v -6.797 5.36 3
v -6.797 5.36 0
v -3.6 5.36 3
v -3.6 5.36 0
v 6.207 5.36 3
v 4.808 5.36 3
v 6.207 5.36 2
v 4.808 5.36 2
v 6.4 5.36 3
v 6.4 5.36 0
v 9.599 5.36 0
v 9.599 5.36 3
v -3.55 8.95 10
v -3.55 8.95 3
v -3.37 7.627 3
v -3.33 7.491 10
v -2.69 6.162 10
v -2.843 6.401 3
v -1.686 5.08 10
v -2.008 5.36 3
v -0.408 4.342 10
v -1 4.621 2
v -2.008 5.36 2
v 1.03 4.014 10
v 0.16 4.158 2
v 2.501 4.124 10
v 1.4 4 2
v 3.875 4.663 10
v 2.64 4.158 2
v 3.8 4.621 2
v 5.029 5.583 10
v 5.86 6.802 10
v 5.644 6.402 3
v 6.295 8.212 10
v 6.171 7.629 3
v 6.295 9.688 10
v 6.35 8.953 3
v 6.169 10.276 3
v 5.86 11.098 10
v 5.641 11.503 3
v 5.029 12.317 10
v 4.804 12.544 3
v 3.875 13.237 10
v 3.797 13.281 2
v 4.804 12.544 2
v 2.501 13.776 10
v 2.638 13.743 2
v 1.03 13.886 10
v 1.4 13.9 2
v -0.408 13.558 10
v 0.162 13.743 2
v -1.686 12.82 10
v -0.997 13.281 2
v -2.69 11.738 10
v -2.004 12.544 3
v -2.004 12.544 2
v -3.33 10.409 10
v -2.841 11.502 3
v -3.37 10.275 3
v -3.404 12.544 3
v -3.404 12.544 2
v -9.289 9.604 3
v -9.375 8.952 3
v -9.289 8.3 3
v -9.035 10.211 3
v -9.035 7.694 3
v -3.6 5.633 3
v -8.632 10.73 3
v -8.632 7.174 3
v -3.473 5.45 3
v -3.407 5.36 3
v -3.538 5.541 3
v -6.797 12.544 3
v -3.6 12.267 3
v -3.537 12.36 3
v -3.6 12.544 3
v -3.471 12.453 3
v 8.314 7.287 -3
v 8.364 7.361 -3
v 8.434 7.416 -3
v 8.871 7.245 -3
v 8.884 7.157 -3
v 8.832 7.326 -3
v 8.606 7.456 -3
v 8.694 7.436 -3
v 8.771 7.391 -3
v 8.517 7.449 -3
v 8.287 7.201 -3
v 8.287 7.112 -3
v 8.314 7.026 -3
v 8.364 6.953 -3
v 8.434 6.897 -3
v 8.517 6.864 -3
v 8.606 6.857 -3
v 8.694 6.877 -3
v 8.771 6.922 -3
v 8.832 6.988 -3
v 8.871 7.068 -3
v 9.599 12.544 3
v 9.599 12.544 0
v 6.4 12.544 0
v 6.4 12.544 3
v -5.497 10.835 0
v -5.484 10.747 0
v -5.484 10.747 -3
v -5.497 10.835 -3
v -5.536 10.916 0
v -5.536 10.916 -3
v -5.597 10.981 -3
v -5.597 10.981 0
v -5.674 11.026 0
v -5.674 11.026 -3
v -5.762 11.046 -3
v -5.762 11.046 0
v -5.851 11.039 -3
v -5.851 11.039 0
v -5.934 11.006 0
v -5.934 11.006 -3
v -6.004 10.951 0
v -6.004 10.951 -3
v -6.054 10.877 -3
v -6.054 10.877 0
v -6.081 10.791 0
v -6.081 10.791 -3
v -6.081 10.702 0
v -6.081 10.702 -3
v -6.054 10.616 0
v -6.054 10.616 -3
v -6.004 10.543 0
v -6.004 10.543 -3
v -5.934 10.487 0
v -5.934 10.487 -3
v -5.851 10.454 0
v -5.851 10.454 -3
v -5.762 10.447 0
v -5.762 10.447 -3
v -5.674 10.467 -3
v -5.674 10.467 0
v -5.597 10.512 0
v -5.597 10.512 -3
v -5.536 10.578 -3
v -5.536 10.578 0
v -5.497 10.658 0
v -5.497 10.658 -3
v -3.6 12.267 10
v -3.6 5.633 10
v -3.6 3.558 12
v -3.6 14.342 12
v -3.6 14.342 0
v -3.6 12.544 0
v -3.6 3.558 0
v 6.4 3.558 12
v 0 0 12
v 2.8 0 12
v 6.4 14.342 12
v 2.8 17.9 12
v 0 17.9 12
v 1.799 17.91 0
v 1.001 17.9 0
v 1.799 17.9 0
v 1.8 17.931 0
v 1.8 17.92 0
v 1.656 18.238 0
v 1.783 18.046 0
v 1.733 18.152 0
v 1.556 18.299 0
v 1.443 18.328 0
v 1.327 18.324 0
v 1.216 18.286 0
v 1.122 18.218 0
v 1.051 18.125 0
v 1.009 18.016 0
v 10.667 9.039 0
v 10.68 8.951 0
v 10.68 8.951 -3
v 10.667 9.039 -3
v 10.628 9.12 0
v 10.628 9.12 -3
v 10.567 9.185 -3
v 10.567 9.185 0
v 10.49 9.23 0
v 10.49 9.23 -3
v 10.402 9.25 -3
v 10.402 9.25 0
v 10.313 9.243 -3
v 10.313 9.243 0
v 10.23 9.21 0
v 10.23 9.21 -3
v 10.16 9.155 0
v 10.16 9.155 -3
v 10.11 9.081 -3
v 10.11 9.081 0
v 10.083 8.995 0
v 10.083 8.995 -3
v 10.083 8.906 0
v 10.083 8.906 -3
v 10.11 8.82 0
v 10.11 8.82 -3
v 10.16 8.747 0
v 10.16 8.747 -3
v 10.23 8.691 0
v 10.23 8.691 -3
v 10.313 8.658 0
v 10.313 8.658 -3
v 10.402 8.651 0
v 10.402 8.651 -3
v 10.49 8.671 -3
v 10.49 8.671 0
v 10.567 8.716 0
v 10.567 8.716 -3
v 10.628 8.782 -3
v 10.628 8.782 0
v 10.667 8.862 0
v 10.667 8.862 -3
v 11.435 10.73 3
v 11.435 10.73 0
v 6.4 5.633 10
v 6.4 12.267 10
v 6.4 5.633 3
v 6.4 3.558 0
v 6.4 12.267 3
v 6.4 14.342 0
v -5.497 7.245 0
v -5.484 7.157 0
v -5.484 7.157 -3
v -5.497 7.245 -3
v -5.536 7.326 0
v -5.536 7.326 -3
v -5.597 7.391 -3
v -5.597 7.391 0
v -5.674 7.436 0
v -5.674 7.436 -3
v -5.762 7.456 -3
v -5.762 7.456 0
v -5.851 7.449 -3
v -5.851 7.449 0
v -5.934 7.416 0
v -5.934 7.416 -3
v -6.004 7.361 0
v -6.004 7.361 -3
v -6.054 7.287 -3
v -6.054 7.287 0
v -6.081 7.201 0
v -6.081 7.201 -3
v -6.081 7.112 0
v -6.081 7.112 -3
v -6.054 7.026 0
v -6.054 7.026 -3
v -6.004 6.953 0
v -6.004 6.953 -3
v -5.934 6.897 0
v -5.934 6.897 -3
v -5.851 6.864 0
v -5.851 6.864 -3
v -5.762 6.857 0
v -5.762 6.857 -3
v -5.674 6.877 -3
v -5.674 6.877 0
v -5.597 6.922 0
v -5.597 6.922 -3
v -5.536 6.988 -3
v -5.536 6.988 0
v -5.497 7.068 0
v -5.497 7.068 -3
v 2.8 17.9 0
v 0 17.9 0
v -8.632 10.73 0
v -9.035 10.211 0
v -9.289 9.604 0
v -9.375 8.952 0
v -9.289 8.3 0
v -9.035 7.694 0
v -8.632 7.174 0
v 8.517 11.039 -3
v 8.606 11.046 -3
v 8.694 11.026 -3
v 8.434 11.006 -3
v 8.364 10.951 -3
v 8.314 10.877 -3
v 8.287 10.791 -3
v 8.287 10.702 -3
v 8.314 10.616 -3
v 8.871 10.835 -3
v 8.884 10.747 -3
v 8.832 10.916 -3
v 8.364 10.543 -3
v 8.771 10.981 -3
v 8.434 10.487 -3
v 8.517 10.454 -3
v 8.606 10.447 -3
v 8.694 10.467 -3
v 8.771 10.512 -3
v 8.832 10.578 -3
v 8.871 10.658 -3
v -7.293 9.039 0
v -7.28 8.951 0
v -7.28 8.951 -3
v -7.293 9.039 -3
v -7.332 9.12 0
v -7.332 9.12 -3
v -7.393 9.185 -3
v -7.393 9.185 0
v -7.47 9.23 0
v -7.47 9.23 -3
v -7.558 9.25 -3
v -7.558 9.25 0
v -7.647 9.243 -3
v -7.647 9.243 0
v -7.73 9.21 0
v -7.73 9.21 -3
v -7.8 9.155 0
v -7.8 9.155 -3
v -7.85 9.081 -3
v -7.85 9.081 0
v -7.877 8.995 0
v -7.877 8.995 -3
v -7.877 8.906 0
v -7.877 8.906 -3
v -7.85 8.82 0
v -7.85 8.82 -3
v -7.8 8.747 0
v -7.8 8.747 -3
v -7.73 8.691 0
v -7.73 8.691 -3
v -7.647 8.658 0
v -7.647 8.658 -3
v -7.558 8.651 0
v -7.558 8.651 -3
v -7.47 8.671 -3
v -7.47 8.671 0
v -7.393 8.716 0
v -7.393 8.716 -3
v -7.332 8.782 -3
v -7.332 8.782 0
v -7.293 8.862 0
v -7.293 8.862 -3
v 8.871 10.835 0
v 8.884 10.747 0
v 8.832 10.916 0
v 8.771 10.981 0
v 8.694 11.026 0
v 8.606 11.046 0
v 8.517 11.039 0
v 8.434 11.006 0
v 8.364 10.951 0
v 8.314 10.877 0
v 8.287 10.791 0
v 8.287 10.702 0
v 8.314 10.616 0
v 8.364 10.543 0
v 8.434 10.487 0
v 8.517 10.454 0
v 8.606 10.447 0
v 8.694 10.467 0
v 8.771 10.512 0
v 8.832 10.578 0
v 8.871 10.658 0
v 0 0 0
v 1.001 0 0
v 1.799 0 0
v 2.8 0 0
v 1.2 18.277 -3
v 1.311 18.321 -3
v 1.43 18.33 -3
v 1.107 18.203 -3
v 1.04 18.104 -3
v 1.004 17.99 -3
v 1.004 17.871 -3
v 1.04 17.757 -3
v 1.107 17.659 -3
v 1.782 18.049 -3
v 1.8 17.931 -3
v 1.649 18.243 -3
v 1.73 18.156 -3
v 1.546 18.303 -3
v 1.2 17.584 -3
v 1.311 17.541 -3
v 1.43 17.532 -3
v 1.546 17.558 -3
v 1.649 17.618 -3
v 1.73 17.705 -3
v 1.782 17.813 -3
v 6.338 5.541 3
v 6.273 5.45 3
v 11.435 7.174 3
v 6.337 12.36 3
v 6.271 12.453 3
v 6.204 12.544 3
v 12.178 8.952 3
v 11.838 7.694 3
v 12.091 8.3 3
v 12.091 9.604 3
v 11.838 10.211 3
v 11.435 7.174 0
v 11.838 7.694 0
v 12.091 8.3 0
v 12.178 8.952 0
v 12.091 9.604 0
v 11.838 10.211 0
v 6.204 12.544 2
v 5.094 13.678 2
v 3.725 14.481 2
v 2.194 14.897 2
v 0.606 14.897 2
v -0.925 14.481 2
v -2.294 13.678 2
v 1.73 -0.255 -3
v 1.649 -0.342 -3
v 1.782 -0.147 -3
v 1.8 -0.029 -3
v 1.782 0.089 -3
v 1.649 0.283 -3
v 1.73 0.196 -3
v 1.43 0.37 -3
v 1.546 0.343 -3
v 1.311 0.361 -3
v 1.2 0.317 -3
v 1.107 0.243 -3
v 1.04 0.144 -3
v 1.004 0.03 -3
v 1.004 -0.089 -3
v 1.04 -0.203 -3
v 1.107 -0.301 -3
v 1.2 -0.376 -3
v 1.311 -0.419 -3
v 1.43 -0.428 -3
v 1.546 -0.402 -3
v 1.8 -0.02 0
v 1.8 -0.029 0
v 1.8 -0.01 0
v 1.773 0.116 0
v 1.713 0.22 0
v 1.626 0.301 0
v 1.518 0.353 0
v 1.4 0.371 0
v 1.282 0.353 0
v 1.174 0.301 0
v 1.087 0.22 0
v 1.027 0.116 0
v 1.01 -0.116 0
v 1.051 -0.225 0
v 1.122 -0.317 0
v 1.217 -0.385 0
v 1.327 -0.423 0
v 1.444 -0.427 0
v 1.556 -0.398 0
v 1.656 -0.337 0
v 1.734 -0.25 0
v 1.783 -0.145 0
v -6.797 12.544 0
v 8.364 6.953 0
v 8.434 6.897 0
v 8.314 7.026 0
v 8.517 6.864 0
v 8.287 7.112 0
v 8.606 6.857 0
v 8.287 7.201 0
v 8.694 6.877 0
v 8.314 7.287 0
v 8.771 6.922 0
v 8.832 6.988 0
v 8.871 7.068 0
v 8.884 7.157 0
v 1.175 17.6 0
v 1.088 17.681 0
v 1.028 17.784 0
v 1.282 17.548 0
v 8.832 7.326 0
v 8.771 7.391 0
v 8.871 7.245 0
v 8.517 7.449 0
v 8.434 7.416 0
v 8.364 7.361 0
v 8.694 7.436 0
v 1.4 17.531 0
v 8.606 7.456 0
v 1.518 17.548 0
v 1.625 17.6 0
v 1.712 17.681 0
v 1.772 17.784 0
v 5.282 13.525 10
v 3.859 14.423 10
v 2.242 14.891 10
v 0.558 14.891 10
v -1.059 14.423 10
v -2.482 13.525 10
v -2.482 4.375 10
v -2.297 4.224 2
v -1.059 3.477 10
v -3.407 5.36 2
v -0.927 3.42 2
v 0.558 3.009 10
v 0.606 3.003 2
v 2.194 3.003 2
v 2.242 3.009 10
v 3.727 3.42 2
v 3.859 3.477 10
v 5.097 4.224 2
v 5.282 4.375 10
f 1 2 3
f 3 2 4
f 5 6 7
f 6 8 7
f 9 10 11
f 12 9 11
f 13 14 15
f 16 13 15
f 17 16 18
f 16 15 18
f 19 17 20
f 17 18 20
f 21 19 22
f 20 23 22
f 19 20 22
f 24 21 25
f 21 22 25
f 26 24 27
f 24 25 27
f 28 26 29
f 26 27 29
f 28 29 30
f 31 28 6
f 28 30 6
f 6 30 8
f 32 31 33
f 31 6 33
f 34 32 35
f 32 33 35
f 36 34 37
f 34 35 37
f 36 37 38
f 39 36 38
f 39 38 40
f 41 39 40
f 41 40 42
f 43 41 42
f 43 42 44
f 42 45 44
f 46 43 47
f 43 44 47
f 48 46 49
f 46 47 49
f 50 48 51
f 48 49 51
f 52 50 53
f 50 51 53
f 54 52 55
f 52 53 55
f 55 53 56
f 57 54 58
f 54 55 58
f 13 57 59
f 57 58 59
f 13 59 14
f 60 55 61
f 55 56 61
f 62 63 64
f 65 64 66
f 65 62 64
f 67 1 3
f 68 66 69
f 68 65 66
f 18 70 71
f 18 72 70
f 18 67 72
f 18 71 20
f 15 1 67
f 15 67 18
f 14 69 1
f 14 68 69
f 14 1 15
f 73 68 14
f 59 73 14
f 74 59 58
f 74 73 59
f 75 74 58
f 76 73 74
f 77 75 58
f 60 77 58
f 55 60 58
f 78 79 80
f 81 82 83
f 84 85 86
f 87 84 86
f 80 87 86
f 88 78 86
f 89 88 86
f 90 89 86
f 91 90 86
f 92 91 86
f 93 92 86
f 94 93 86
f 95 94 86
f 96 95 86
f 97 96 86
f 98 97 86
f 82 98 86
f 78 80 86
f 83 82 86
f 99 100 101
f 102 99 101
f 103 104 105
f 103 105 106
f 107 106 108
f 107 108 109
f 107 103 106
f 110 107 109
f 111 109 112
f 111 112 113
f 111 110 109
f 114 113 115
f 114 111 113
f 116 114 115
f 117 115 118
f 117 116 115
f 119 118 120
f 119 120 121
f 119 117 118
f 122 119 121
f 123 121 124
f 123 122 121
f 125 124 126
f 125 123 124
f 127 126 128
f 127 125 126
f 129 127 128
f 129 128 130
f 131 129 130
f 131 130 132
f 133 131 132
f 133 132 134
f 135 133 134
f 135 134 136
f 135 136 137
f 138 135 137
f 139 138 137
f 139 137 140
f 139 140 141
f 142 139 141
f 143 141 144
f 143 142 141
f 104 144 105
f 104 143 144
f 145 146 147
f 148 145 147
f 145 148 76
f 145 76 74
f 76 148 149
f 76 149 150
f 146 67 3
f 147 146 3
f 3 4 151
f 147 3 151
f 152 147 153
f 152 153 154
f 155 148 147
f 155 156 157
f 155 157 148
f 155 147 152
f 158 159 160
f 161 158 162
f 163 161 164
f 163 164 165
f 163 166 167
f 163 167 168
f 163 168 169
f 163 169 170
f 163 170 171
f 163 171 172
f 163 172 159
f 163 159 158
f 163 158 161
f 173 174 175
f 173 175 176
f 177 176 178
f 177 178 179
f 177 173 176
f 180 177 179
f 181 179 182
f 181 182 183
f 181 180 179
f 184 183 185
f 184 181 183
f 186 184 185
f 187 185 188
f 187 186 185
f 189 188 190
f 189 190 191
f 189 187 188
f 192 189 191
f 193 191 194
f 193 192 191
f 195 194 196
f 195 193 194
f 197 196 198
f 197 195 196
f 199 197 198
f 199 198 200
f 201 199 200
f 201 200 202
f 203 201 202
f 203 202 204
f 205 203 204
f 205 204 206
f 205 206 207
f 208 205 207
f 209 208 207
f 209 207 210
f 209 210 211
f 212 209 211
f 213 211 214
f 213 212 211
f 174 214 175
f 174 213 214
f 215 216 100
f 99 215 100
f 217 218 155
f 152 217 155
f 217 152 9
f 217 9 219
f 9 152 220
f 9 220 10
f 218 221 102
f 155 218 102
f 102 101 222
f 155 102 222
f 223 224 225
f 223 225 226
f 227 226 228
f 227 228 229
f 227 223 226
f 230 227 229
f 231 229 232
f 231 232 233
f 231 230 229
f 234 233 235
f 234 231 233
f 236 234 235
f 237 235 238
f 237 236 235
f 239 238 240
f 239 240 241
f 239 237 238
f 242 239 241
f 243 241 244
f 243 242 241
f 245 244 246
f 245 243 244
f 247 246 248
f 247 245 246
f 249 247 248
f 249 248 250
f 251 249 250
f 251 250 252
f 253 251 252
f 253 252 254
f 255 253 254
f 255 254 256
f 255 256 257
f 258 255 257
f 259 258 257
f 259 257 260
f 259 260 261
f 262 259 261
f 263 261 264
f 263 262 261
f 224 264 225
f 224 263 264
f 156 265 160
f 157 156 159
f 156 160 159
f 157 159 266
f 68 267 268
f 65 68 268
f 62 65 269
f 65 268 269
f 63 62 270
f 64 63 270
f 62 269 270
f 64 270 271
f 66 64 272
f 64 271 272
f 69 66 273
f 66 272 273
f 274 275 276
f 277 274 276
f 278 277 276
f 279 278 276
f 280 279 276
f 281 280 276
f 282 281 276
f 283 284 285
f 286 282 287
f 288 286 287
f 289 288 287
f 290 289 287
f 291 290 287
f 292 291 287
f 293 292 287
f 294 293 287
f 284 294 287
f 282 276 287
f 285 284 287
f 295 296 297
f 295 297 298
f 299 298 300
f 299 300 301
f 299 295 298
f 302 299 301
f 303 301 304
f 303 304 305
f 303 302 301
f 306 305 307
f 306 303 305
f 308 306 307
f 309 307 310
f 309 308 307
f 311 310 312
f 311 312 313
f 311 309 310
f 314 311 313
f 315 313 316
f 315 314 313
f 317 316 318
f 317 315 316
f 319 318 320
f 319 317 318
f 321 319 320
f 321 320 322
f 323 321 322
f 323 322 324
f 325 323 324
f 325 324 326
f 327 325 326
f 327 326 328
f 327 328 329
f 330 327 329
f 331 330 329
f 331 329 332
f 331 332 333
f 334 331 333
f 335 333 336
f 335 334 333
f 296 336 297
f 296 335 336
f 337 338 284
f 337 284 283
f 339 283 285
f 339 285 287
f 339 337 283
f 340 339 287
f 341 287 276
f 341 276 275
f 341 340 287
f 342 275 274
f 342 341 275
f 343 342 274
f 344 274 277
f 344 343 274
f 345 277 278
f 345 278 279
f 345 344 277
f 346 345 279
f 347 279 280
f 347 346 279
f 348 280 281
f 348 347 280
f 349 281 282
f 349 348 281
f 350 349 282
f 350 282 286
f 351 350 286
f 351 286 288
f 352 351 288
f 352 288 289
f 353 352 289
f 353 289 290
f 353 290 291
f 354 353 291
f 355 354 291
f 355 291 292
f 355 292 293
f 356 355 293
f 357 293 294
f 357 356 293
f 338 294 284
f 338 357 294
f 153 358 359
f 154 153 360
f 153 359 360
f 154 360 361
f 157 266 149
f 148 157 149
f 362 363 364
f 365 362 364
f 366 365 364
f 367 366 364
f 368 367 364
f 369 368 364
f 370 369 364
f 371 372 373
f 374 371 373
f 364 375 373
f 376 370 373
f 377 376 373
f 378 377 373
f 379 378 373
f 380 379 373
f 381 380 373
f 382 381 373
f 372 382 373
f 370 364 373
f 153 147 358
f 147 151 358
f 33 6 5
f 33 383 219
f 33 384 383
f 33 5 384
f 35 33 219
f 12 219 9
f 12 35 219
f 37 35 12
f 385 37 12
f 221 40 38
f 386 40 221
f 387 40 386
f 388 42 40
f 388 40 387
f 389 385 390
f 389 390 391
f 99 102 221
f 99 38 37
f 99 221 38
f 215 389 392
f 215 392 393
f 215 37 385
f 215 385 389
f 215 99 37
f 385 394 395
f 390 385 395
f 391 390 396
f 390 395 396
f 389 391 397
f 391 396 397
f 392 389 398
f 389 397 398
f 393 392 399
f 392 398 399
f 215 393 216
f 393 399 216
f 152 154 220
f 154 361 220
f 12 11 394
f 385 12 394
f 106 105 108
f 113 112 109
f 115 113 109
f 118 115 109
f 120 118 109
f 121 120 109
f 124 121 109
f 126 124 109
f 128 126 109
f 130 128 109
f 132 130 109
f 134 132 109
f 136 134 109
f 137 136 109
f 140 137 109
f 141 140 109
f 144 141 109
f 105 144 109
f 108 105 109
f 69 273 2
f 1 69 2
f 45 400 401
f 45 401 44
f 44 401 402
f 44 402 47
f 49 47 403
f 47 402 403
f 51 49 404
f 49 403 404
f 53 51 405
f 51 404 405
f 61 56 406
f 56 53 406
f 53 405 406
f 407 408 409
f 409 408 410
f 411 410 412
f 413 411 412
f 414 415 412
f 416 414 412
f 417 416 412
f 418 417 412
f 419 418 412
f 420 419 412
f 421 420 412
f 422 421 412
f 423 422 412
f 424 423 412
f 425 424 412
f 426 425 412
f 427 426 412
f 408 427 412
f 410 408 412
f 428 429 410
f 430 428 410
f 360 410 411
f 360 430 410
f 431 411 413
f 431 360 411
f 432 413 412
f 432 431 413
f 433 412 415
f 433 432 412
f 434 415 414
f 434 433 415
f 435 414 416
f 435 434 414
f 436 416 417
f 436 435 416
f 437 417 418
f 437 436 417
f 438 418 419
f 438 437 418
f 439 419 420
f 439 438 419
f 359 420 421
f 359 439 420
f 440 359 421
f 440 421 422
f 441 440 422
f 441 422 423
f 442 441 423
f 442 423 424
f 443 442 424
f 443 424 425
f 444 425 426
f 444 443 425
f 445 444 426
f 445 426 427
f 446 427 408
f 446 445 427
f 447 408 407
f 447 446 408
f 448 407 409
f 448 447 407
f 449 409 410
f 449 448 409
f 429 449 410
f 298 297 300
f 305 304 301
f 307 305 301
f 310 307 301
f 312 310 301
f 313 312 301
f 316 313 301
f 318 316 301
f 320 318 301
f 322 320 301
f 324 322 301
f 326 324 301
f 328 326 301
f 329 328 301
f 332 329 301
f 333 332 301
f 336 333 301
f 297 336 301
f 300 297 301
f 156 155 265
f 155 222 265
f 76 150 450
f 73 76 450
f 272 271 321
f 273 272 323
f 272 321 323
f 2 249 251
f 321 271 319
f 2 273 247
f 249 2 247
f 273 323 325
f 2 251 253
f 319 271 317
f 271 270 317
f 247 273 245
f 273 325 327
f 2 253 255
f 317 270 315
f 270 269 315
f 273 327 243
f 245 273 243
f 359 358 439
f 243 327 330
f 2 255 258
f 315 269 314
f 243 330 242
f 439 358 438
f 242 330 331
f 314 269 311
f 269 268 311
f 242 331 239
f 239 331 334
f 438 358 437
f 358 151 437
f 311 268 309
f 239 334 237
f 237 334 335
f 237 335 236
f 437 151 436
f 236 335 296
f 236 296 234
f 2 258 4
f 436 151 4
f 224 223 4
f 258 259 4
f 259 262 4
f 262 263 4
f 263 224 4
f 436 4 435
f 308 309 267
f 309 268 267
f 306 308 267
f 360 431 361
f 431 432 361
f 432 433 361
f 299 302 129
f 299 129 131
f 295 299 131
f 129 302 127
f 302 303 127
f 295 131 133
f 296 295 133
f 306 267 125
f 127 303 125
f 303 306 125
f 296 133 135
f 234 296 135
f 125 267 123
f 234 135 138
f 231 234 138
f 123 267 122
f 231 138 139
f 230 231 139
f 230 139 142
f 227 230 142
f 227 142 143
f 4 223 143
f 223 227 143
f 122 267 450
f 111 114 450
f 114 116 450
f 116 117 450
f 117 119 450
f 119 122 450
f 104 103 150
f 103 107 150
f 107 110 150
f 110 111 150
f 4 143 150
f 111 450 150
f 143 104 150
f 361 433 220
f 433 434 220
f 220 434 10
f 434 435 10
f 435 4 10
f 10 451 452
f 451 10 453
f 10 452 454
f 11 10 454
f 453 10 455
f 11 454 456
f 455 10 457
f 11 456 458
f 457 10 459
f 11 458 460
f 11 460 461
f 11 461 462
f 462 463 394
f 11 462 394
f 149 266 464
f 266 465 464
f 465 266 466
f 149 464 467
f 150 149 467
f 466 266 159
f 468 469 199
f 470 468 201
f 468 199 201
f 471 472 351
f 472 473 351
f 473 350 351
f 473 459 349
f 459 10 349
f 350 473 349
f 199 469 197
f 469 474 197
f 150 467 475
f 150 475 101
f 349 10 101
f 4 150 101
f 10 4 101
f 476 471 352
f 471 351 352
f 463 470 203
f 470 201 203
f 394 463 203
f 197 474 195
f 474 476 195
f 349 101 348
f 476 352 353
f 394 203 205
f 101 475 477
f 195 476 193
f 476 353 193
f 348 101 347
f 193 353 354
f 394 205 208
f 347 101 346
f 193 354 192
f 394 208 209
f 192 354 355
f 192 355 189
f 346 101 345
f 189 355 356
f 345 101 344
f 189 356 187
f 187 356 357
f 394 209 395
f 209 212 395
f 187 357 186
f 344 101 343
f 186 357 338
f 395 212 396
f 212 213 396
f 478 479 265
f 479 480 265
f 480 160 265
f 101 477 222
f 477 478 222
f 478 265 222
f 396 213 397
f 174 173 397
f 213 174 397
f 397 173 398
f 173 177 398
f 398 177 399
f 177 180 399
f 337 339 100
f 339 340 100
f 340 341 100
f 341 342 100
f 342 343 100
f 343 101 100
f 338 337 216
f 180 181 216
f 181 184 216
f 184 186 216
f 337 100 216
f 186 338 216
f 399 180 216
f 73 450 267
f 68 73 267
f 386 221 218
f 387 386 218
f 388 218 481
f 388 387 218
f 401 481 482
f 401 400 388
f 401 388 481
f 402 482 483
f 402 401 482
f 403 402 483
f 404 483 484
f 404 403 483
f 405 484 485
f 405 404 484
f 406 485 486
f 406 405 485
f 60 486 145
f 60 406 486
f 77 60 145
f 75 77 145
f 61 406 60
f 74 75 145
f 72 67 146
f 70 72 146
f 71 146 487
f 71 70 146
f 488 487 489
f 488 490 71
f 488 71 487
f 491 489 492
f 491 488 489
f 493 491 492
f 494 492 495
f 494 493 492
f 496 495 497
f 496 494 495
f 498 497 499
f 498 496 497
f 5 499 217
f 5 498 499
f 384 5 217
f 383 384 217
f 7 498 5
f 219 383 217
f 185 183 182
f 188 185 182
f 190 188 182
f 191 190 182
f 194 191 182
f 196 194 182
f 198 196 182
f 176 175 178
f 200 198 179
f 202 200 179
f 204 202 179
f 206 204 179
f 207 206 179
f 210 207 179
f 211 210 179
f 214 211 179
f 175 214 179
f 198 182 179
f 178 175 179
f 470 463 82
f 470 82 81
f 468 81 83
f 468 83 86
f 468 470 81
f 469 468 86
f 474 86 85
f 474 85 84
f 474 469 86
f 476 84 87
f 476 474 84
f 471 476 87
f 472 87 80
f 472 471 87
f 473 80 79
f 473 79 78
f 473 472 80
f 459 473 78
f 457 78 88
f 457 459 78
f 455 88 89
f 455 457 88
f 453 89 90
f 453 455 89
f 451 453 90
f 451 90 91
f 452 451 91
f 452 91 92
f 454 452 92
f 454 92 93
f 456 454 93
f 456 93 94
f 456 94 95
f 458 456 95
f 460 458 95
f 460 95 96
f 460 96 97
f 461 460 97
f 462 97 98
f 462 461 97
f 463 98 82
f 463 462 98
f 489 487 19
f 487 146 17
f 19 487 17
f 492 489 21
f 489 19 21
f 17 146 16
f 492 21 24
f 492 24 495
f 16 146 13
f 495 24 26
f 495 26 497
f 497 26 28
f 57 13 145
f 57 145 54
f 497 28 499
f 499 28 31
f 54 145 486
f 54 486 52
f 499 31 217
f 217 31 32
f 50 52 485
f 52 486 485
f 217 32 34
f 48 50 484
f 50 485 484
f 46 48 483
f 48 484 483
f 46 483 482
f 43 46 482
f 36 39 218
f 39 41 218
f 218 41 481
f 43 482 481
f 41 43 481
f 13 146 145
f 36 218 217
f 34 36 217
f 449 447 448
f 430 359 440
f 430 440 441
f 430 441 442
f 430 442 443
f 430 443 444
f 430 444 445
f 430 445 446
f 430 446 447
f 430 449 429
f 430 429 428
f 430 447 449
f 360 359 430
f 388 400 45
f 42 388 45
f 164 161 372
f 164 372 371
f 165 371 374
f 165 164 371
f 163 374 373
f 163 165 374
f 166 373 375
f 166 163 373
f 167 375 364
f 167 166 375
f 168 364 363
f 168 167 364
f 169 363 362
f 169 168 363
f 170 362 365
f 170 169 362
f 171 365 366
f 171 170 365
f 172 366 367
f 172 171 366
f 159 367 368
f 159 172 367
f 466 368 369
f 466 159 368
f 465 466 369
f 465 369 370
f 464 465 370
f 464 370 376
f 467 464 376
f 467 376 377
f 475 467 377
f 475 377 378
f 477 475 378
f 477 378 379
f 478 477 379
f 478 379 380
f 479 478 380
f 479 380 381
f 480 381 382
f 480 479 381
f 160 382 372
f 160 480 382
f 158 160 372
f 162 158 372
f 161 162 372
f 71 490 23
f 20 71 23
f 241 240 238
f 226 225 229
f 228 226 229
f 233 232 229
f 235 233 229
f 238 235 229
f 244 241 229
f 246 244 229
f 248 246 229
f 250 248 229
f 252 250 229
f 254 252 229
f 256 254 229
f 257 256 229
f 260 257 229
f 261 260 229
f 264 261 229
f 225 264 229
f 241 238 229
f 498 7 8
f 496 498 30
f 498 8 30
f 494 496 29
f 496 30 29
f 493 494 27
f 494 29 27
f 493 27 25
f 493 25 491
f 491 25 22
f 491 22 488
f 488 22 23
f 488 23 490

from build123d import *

# Parameters (mm, degrees)
EXTRUDE_1_DEPTH = 2
EXTRUDE_2_DEPTH = 8
EXTRUDE_3_DEPTH = 2
SKETCH_4_R      = 4.95
EXTRUDE_4_DEPTH = 8
EXTRUDE_5_DEPTH = 3
SKETCH_6_R      = 0.3
SKETCH_6_R_2    = 0.4
EXTRUDE_6_DEPTH = 3


with BuildPart() as part:
    # Эскиз1 → Бобышка-Вытянуть1 (new body)
    with BuildSketch(Plane.XY):
        Polygon((0, 17.9), (2.8, 17.9), (6.4, 14.342331177), (6.4, 3.557668823), (2.8, 0), (0, 0), (-3.6, 3.557668823), (-3.6, 14.342331177), align=None)
    extrude(amount=EXTRUDE_1_DEPTH)

    # Эскиз2 → Бобышка-Вытянуть2 (add)
    with BuildSketch(Plane.XY.offset(2)):
        with BuildLine():
            Line((6.4, 5.63337521), (6.4, 3.557668823))
            Line((6.4, 3.557668823), (2.8, 0))
            Line((2.8, 0), (0, 0))
            Line((0, 0), (-3.6, 3.557668823))
            Line((-3.6, 3.557668823), (-3.6, 5.63337521))
            ThreePointArc((-3.6, 5.63337521), (1.4, 2.95), (6.4, 5.63337521))
        make_face()
        with BuildLine():
            Line((-3.6, 12.26662479), (-3.6, 14.342331177))
            Line((-3.6, 14.342331177), (0, 17.9))
            Line((0, 17.9), (2.8, 17.9))
            Line((2.8, 17.9), (6.4, 14.342331177))
            Line((6.4, 14.342331177), (6.4, 12.26662479))
            ThreePointArc((6.4, 12.26662479), (1.4, 14.95), (-3.6, 12.26662479))
        make_face()
    extrude(amount=EXTRUDE_2_DEPTH)

    # Эскиз3 → Бобышка-Вытянуть3 (add)
    with BuildSketch(Plane.XY.offset(10)):
        Polygon((-3.6, 14.342331177), (-3.6, 3.557668823), (0, 0), (2.8, 0), (6.4, 3.557668823), (6.4, 14.342331177), (2.8, 17.9), (0, 17.9), align=None)
    extrude(amount=EXTRUDE_3_DEPTH)

    # Эскиз4 → Бобышка-Вытянуть4 (add)
    with BuildSketch(Plane.XY.offset(2)):
        with Locations(Location((1.4, 8.95, 0), (0, 0, 180))):
            Circle(SKETCH_4_R)
    extrude(amount=EXTRUDE_4_DEPTH)

    # Эскиз5 → Бобышка-Вытянуть5 (add)
    with BuildSketch(Plane.XY):
        with BuildLine():
            Line((9.599401359, 12.544204897), (-6.796786669, 12.544204897))
            Line((-6.796786669, 12.544204897), (-8.632281469, 10.730293057))
            ThreePointArc((-8.632281469, 10.730293057), (-9.375, 8.952102448), (-8.632281469, 7.17391184))
            Line((-8.632281469, 7.17391184), (-6.796786669, 5.36))
            Line((-6.796786669, 5.36), (9.599401359, 5.36))
            Line((9.599401359, 5.36), (11.434896159, 7.17391184))
            ThreePointArc((11.434896159, 7.17391184), (12.177614691, 8.952102448), (11.434896159, 10.730293057))
            Line((11.434896159, 10.730293057), (9.599401359, 12.544204897))
        make_face()
    extrude(amount=EXTRUDE_5_DEPTH)

    # Эскиз6 → Бобышка-Вытянуть6 (add)
    with BuildSketch(Plane.XY):
        with Locations((10.38, 8.950654336)):
            Circle(SKETCH_6_R)
        with Locations((8.584, 10.746654336)):
            Circle(SKETCH_6_R)
        with Locations((8.584, 7.156654336)):
            Circle(SKETCH_6_R)
        with Locations((-5.784, 10.746654336)):
            Circle(SKETCH_6_R)
        with Locations((-7.58, 8.950654336)):
            Circle(SKETCH_6_R)
        with Locations((-5.784, 7.156654336)):
            Circle(SKETCH_6_R)
        with Locations((1.4, 17.930654336)):
            Circle(SKETCH_6_R_2)
        with Locations((1.4, -0.029345664)):
            Circle(SKETCH_6_R_2)
    extrude(amount=-EXTRUDE_6_DEPTH)


solid = part.part
